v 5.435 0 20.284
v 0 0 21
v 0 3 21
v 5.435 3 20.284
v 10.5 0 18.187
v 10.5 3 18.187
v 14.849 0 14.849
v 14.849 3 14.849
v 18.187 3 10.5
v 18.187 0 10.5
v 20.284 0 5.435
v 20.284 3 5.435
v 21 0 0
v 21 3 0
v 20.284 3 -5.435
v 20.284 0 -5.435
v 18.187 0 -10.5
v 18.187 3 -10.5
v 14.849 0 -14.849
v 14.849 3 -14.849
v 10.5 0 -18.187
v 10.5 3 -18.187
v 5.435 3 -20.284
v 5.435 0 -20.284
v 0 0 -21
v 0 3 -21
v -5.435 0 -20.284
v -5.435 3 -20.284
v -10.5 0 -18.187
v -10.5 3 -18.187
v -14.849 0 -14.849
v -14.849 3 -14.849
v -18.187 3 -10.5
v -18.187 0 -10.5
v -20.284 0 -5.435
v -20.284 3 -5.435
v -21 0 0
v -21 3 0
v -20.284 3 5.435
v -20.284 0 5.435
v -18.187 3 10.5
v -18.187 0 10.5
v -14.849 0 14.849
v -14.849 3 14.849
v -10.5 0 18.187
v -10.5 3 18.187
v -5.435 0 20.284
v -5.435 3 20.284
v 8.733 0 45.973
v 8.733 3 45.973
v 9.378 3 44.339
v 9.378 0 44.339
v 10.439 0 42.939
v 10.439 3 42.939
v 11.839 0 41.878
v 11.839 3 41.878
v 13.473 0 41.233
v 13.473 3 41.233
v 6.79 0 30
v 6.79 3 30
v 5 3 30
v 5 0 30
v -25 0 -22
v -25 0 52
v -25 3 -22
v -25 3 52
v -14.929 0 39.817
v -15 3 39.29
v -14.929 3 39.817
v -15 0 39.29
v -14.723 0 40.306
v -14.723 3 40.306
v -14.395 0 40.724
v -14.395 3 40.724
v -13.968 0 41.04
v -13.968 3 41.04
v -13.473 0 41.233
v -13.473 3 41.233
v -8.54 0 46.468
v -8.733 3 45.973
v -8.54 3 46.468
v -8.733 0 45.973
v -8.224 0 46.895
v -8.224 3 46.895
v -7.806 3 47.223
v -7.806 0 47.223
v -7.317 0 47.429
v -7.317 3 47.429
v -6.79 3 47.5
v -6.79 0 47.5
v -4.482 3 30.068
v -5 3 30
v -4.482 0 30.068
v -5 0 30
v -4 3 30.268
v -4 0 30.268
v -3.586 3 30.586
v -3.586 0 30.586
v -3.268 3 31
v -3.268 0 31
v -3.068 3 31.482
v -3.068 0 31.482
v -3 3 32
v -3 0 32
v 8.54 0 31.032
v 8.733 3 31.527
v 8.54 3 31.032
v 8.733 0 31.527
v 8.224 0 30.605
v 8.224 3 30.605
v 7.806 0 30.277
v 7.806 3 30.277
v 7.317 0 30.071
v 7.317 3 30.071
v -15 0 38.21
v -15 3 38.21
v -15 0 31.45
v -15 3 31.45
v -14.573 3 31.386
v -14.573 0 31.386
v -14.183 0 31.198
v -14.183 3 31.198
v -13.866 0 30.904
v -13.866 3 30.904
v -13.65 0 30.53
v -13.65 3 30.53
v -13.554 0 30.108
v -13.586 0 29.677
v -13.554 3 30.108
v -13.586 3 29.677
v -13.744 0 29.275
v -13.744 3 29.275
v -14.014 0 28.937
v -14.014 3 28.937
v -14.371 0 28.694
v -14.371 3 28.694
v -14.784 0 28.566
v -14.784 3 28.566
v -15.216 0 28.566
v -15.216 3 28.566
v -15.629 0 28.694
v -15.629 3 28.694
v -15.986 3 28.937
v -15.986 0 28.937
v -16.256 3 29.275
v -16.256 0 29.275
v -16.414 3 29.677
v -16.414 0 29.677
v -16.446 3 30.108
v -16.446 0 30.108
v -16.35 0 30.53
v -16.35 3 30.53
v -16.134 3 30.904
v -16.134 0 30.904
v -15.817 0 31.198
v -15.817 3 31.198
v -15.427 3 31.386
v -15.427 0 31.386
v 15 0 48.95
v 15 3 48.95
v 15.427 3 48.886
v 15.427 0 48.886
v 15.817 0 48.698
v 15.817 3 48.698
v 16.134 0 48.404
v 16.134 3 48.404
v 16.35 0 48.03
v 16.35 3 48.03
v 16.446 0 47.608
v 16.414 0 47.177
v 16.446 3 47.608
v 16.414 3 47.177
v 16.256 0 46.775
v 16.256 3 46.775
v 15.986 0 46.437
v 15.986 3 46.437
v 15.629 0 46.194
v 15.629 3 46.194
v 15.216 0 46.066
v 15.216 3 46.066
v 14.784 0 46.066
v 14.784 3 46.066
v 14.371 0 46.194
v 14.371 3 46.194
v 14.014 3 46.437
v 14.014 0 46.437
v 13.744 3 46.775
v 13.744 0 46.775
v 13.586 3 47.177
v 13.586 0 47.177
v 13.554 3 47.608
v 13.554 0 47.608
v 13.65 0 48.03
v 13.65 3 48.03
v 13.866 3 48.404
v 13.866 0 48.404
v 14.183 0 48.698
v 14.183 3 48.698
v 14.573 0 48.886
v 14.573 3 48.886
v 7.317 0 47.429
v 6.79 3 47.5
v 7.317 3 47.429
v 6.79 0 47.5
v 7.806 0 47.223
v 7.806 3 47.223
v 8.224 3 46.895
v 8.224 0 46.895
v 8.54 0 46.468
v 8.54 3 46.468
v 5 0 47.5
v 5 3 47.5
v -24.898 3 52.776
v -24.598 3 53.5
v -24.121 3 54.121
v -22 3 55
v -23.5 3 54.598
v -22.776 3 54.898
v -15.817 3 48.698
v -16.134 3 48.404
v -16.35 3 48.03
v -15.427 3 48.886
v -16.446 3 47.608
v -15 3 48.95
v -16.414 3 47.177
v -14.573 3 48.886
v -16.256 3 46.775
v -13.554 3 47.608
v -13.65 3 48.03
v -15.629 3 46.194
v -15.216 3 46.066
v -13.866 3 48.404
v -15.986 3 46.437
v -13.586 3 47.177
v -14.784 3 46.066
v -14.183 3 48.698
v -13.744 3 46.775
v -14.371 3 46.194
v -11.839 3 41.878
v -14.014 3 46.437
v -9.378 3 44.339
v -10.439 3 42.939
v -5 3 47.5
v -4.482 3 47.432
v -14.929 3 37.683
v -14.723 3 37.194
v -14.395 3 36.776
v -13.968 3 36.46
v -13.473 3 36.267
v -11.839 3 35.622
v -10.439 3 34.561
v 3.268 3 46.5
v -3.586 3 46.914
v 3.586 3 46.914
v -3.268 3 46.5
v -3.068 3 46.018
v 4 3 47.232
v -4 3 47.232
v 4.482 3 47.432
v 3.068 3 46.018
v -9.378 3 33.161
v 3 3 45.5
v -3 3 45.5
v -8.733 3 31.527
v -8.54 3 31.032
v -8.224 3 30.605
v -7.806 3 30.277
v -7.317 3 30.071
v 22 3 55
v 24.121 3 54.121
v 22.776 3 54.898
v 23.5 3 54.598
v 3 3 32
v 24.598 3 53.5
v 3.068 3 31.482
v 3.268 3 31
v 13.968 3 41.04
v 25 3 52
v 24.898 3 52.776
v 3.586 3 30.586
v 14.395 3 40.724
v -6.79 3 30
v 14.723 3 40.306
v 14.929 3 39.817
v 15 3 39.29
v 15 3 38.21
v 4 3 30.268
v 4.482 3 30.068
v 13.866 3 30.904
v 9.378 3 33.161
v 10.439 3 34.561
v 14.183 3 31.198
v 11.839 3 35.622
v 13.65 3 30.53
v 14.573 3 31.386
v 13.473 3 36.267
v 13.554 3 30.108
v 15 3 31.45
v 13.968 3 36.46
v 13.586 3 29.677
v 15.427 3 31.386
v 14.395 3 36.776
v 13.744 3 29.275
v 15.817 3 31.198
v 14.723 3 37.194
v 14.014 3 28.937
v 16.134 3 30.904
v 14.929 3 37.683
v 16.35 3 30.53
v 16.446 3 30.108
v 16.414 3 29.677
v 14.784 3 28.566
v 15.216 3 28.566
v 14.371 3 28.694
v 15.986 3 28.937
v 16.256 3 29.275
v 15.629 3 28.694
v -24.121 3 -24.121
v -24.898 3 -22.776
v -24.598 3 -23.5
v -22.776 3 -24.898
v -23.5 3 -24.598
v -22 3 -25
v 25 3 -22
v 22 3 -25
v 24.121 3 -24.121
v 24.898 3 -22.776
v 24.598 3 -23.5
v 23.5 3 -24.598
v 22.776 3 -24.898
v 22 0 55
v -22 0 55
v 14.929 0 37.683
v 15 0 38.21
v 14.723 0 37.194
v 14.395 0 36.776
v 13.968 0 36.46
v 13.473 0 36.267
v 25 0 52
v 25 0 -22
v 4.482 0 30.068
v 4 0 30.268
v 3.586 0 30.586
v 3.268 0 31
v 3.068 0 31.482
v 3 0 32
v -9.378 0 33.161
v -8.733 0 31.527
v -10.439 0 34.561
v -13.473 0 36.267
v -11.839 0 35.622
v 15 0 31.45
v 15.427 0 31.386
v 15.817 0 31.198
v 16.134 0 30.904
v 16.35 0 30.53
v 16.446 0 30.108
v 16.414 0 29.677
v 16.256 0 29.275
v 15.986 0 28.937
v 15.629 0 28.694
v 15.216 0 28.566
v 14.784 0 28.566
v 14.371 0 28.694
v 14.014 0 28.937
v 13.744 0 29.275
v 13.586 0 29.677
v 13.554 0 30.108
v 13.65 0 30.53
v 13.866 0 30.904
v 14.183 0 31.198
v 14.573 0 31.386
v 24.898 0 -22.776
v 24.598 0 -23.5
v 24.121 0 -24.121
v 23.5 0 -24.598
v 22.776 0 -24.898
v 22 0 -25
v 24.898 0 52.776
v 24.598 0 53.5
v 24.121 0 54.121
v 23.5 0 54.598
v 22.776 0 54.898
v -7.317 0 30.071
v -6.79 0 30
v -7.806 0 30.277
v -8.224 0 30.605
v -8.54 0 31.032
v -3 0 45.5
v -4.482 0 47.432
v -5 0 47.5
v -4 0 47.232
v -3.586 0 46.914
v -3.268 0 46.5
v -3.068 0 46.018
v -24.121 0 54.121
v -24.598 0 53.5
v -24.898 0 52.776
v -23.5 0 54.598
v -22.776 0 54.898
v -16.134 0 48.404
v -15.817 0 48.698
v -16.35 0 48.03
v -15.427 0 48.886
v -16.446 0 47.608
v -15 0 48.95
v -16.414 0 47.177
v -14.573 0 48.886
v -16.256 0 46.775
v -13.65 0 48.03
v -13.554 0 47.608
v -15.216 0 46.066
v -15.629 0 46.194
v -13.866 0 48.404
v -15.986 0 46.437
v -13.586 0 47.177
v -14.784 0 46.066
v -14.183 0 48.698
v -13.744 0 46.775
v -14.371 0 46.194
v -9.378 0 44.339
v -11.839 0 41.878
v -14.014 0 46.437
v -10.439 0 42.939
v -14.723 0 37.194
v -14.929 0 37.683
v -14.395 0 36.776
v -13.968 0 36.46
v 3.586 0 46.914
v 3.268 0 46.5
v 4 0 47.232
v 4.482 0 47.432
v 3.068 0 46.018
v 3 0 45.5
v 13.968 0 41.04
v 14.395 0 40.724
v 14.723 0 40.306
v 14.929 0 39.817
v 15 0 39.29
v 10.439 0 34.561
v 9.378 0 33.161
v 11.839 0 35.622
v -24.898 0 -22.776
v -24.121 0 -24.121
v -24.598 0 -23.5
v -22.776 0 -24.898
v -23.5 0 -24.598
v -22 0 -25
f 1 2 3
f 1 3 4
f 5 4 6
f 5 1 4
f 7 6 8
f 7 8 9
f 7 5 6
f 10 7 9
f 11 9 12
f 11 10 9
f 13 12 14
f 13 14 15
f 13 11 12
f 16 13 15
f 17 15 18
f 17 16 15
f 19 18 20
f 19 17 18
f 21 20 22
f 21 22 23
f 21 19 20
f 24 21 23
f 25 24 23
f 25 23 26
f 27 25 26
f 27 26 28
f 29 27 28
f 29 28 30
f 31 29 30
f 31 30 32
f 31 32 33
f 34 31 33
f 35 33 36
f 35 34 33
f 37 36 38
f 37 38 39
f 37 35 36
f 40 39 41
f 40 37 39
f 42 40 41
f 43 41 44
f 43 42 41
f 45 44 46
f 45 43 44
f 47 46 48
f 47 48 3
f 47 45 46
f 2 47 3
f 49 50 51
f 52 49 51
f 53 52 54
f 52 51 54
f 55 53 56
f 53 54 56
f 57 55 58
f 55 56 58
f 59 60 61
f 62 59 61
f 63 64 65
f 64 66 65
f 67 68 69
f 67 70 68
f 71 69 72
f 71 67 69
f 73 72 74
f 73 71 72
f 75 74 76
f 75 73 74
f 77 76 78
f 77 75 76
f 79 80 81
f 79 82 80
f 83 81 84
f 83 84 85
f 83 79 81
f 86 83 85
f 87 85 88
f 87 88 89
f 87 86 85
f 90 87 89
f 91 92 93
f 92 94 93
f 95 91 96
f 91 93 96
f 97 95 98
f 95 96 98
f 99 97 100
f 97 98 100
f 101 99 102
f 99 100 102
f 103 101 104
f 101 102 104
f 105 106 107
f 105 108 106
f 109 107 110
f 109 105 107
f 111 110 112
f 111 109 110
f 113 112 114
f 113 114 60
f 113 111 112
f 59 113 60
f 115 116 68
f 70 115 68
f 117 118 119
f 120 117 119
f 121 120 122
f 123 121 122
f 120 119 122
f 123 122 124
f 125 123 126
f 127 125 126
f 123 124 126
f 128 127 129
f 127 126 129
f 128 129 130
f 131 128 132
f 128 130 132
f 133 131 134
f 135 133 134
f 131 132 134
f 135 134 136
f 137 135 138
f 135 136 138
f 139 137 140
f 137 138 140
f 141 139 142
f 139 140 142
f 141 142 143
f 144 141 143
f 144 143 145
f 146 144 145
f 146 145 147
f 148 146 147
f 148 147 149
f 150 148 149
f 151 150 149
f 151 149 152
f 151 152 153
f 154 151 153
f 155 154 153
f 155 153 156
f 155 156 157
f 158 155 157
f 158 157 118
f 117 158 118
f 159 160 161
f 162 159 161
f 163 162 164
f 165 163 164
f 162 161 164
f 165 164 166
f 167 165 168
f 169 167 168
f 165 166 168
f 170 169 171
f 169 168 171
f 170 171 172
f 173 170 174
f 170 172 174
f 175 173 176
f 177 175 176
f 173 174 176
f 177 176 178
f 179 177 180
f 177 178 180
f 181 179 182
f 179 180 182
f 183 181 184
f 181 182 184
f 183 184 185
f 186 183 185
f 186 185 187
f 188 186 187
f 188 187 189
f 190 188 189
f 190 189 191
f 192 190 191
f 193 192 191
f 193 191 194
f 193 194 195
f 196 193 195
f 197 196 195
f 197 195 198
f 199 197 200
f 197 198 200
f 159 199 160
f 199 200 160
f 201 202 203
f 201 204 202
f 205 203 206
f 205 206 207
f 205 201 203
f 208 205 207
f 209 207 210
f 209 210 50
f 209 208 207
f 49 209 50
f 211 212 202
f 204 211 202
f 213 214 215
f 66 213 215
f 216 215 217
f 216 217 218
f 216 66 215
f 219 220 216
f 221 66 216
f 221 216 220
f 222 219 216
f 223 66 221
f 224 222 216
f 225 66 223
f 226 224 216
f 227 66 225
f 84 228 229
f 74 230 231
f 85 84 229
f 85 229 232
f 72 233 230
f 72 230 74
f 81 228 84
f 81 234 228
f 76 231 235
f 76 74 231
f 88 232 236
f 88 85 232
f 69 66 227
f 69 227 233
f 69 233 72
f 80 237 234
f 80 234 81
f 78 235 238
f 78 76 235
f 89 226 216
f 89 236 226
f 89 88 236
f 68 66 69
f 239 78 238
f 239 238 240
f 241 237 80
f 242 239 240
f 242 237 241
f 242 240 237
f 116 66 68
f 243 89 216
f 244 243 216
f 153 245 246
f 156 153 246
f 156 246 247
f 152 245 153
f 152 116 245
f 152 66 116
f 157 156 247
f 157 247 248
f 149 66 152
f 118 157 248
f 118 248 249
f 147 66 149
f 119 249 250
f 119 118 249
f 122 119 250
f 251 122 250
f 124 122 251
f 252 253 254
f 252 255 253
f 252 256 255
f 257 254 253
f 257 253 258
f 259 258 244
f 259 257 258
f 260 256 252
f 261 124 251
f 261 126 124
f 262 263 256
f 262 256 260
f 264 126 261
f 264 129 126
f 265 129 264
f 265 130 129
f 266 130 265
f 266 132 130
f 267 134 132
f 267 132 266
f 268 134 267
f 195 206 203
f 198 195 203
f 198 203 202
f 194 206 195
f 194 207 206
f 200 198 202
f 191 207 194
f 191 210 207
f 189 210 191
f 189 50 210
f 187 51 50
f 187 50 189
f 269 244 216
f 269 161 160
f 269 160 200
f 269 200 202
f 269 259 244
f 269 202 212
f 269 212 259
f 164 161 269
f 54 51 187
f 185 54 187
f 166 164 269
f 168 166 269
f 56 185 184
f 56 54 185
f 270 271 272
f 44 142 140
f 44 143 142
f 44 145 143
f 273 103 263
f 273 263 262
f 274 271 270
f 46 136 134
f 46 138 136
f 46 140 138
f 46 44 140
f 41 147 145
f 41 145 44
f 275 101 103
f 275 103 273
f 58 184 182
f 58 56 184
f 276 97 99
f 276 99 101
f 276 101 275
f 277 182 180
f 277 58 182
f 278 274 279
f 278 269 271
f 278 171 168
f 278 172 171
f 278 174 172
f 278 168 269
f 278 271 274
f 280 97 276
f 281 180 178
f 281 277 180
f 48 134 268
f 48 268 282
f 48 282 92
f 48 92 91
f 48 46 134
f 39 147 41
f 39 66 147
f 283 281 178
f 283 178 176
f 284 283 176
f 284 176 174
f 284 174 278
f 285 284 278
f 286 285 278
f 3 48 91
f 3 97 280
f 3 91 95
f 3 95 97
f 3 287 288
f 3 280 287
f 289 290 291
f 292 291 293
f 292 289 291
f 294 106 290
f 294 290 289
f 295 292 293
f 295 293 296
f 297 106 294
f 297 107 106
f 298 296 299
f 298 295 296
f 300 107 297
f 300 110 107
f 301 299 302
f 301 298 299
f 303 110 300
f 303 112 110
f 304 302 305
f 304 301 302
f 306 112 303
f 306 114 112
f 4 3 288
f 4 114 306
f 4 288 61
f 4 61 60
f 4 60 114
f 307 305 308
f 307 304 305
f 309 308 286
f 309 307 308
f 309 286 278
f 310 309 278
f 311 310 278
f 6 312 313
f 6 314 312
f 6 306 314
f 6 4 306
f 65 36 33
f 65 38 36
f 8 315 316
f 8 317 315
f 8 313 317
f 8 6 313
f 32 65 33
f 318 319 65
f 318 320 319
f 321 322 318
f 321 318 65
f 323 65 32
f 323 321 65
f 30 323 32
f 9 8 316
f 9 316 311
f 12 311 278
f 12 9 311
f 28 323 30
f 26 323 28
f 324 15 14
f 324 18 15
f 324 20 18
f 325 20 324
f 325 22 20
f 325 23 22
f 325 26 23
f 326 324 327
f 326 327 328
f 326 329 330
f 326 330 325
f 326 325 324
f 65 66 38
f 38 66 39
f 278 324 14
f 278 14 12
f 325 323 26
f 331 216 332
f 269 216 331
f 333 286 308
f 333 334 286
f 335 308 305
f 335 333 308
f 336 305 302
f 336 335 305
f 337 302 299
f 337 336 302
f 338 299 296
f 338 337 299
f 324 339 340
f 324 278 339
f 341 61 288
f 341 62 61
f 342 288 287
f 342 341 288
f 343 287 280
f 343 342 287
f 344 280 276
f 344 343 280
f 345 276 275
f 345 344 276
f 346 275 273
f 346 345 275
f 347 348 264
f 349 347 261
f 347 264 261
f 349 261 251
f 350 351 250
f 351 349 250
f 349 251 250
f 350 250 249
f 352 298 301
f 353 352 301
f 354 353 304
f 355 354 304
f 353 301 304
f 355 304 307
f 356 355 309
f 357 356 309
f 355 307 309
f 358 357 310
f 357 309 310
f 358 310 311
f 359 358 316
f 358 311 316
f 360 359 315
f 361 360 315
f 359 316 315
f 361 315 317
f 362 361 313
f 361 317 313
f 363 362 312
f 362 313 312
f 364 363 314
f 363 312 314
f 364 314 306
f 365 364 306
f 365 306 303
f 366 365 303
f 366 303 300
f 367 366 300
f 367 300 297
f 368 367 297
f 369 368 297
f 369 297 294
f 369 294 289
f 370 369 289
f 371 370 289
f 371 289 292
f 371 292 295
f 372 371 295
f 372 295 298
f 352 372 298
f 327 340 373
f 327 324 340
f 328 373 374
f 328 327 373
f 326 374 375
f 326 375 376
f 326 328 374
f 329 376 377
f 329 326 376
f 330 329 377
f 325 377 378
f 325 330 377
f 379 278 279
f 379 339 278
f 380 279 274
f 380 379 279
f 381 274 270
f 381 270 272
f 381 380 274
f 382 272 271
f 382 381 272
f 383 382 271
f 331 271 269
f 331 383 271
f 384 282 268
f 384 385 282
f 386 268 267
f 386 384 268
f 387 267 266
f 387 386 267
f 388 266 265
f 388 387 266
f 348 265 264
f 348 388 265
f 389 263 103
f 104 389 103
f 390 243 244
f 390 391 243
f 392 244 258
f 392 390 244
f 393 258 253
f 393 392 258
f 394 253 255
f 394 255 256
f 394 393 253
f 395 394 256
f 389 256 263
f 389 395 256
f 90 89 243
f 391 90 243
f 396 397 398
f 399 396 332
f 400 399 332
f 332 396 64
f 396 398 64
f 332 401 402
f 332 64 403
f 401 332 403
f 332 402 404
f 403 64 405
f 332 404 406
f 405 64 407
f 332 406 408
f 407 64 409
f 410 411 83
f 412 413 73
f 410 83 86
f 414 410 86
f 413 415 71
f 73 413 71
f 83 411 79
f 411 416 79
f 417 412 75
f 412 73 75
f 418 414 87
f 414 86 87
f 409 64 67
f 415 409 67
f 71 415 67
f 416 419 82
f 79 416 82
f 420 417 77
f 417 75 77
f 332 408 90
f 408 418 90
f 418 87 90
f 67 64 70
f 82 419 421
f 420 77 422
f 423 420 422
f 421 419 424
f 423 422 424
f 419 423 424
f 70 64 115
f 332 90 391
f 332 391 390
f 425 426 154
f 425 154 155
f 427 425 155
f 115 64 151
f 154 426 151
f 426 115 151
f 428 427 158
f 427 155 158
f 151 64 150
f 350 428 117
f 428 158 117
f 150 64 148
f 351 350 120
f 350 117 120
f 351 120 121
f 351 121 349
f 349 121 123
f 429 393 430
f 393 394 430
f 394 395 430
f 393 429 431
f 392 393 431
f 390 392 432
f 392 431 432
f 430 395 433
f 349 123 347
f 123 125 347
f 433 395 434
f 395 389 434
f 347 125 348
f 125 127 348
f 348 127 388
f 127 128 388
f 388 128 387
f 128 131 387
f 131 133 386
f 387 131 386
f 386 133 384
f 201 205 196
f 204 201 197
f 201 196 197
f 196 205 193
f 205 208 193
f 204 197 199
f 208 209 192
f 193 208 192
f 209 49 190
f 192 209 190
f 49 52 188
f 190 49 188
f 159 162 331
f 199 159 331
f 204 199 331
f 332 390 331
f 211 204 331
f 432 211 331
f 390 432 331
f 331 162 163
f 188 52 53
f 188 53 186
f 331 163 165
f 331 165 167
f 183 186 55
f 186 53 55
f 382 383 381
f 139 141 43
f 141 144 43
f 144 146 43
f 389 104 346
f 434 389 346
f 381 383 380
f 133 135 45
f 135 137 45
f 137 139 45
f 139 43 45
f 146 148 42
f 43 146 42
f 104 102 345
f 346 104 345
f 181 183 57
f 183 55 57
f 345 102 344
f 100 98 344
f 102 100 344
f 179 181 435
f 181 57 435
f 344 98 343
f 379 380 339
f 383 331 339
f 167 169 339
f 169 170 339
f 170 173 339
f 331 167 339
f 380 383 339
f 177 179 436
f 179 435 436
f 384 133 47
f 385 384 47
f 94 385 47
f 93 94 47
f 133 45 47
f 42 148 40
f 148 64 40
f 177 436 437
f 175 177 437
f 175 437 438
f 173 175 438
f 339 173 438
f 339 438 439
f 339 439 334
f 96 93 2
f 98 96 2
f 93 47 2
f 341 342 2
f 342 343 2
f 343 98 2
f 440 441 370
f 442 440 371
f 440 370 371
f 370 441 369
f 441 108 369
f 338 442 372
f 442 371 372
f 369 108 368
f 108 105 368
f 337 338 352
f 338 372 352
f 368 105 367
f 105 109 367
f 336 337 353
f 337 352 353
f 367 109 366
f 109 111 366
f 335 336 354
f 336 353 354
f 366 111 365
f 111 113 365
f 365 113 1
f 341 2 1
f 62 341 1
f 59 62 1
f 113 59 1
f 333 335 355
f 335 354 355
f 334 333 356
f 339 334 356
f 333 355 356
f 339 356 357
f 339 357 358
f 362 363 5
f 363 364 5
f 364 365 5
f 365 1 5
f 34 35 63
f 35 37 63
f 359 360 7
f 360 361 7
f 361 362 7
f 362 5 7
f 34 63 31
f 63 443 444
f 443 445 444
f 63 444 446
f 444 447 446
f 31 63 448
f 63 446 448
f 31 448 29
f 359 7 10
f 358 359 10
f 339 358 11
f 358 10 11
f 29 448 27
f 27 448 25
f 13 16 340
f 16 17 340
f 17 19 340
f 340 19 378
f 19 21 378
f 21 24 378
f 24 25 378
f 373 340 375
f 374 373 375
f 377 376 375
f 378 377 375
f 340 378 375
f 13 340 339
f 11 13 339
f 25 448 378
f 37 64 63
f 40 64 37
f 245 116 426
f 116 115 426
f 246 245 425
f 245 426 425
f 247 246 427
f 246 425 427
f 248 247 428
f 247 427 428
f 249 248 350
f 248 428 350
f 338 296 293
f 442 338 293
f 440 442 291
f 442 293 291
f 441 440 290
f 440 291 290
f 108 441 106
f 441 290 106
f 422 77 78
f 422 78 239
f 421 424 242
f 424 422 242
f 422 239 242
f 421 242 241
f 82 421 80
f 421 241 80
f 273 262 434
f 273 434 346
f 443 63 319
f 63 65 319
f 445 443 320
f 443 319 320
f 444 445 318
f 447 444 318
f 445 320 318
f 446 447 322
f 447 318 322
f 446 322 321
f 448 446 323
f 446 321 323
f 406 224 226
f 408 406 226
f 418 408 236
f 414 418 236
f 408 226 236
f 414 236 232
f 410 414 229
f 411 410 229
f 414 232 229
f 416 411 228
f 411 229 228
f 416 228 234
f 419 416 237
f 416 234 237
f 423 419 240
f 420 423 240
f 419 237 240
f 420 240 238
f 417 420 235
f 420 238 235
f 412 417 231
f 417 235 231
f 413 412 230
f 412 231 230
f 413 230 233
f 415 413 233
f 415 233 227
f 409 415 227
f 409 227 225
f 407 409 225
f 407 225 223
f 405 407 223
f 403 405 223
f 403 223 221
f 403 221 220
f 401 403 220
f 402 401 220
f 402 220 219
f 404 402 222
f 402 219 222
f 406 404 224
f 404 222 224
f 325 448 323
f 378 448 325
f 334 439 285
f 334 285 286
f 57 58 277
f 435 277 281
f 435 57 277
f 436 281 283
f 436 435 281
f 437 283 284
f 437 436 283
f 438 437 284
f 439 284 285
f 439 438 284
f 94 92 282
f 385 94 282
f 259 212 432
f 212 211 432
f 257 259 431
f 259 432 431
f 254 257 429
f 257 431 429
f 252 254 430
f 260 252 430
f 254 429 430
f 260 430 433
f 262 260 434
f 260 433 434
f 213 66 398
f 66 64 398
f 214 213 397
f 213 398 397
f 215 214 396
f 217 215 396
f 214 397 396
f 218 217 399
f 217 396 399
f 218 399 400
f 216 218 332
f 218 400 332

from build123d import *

# Parameters (mm, degrees)
SKETCH_1_W          = 50
SKETCH_1_H          = 50
SKETCH_1_R          = 21
EXTRUDE_1_DEPTH     = 3
SKETCH_2_W          = 50
SKETCH_2_H          = 30
SKETCH_2_R          = 1.45
EXTRUDE_2_DEPTH     = 3
FILLET_1_R          = 3
SKETCH_3_R          = 1.45
CUT_EXTRUDE_1_DEPTH = 61.489668539
CUT_EXTRUDE_7_DEPTH = 61.489668539
SKETCH_13_W         = 6
SKETCH_13_H         = 17.5
EXTRUDE_3_DEPTH     = 3
FILLET_2_R          = 2


with BuildPart() as part:
    # 草图1 → 凸台-拉伸1 (new body)
    with BuildSketch(Plane(origin=(0, 0, 0), x_dir=(1, 0, 0), z_dir=(0, 1, 0))):
        Rectangle(SKETCH_1_W, SKETCH_1_H)
        with Locations(Location((0, 0, 0), (0, 0, 270))):
            Circle(SKETCH_1_R, mode=Mode.SUBTRACT)
    extrude(amount=EXTRUDE_1_DEPTH)

    # 草图2 → 凸台-拉伸2 (add)
    with BuildSketch(Plane(origin=(0, 3, 0), x_dir=(1, 0, 0), z_dir=(0, 1, 0))):
        with Locations((0, -40)):
            Rectangle(SKETCH_2_W, SKETCH_2_H)
        with Locations(Location((-15, -47.5, 0), (0, 0, 270))):
            Circle(SKETCH_2_R, mode=Mode.SUBTRACT)
        with Locations(Location((15, -47.5, 0), (0, 0, 270))):
            Circle(SKETCH_2_R, mode=Mode.SUBTRACT)
    extrude(amount=-EXTRUDE_2_DEPTH)

    # 圆角1
    fillet_1_edges = [part.edges().sort_by_distance(p)[0] for p in [
        (25, 1.5, 55),
        (-25, 1.5, 55),
        (-25, 1.5, -25),
        (25, 1.5, -25),
    ]]
    fillet(fillet_1_edges, radius=FILLET_1_R)

    # 草图3 → 切除-拉伸1 (cut, through all)
    with BuildSketch(Plane(origin=(0, 3, 0), x_dir=(1, 0, 0), z_dir=(0, 1, 0))):
        with Locations(Location((-15, -30, 0), (0, 0, 270))):
            Circle(SKETCH_3_R)
        with Locations(Location((15, -30, 0), (0, 0, 270))):
            Circle(SKETCH_3_R)
    extrude(amount=-CUT_EXTRUDE_1_DEPTH, mode=Mode.SUBTRACT)

    # 草图12 → 切除-拉伸7 (cut, through all)
    with BuildSketch(Plane(origin=(0, 3, 0), x_dir=(1, 0, 0), z_dir=(0, 1, 0))):
        with BuildLine():
            ThreePointArc((-8.55, -30), (-10.439161261, -34.560838739), (-15, -36.45))
            Line((-15, -36.45), (-15, -41.05))
            ThreePointArc((-15, -41.05), (-10.439161261, -42.939161261), (-8.55, -47.5))
            Line((-8.55, -47.5), (8.55, -47.5))
            ThreePointArc((8.55, -47.5), (10.439161261, -42.939161261), (15, -41.05))
            Line((15, -41.05), (15, -36.45))
            ThreePointArc((15, -36.45), (10.439161261, -34.560838739), (8.55, -30))
            Line((8.55, -30), (-8.55, -30))
        make_face()
    extrude(amount=-CUT_EXTRUDE_7_DEPTH, mode=Mode.SUBTRACT)

    # 草图13 → 凸台-拉伸3 (add)
    with BuildSketch(Plane(origin=(0, 3, 0), x_dir=(1, 0, 0), z_dir=(0, 1, 0))):
        with Locations((0, -38.75)):
            Rectangle(SKETCH_13_W, SKETCH_13_H)
    extrude(amount=-EXTRUDE_3_DEPTH)

    # 圆角2
    fillet_2_edges = [part.edges().sort_by_distance(p)[0] for p in [
        (-3, 1.5, 30),
        (3, 1.5, 30),
        (3, 1.5, 47.5),
        (-3, 1.5, 47.5),
        (15, 1.5, 41.05),
        (8.55, 1.5, 47.5),
        (-8.55, 1.5, 47.5),
        (-15, 1.5, 41.05),
        (-15, 1.5, 36.45),
        (-8.55, 1.5, 30),
        (8.55, 1.5, 30),
        (15, 1.5, 36.45),
    ]]
    fillet(fillet_2_edges, radius=FILLET_2_R)


solid = part.part
